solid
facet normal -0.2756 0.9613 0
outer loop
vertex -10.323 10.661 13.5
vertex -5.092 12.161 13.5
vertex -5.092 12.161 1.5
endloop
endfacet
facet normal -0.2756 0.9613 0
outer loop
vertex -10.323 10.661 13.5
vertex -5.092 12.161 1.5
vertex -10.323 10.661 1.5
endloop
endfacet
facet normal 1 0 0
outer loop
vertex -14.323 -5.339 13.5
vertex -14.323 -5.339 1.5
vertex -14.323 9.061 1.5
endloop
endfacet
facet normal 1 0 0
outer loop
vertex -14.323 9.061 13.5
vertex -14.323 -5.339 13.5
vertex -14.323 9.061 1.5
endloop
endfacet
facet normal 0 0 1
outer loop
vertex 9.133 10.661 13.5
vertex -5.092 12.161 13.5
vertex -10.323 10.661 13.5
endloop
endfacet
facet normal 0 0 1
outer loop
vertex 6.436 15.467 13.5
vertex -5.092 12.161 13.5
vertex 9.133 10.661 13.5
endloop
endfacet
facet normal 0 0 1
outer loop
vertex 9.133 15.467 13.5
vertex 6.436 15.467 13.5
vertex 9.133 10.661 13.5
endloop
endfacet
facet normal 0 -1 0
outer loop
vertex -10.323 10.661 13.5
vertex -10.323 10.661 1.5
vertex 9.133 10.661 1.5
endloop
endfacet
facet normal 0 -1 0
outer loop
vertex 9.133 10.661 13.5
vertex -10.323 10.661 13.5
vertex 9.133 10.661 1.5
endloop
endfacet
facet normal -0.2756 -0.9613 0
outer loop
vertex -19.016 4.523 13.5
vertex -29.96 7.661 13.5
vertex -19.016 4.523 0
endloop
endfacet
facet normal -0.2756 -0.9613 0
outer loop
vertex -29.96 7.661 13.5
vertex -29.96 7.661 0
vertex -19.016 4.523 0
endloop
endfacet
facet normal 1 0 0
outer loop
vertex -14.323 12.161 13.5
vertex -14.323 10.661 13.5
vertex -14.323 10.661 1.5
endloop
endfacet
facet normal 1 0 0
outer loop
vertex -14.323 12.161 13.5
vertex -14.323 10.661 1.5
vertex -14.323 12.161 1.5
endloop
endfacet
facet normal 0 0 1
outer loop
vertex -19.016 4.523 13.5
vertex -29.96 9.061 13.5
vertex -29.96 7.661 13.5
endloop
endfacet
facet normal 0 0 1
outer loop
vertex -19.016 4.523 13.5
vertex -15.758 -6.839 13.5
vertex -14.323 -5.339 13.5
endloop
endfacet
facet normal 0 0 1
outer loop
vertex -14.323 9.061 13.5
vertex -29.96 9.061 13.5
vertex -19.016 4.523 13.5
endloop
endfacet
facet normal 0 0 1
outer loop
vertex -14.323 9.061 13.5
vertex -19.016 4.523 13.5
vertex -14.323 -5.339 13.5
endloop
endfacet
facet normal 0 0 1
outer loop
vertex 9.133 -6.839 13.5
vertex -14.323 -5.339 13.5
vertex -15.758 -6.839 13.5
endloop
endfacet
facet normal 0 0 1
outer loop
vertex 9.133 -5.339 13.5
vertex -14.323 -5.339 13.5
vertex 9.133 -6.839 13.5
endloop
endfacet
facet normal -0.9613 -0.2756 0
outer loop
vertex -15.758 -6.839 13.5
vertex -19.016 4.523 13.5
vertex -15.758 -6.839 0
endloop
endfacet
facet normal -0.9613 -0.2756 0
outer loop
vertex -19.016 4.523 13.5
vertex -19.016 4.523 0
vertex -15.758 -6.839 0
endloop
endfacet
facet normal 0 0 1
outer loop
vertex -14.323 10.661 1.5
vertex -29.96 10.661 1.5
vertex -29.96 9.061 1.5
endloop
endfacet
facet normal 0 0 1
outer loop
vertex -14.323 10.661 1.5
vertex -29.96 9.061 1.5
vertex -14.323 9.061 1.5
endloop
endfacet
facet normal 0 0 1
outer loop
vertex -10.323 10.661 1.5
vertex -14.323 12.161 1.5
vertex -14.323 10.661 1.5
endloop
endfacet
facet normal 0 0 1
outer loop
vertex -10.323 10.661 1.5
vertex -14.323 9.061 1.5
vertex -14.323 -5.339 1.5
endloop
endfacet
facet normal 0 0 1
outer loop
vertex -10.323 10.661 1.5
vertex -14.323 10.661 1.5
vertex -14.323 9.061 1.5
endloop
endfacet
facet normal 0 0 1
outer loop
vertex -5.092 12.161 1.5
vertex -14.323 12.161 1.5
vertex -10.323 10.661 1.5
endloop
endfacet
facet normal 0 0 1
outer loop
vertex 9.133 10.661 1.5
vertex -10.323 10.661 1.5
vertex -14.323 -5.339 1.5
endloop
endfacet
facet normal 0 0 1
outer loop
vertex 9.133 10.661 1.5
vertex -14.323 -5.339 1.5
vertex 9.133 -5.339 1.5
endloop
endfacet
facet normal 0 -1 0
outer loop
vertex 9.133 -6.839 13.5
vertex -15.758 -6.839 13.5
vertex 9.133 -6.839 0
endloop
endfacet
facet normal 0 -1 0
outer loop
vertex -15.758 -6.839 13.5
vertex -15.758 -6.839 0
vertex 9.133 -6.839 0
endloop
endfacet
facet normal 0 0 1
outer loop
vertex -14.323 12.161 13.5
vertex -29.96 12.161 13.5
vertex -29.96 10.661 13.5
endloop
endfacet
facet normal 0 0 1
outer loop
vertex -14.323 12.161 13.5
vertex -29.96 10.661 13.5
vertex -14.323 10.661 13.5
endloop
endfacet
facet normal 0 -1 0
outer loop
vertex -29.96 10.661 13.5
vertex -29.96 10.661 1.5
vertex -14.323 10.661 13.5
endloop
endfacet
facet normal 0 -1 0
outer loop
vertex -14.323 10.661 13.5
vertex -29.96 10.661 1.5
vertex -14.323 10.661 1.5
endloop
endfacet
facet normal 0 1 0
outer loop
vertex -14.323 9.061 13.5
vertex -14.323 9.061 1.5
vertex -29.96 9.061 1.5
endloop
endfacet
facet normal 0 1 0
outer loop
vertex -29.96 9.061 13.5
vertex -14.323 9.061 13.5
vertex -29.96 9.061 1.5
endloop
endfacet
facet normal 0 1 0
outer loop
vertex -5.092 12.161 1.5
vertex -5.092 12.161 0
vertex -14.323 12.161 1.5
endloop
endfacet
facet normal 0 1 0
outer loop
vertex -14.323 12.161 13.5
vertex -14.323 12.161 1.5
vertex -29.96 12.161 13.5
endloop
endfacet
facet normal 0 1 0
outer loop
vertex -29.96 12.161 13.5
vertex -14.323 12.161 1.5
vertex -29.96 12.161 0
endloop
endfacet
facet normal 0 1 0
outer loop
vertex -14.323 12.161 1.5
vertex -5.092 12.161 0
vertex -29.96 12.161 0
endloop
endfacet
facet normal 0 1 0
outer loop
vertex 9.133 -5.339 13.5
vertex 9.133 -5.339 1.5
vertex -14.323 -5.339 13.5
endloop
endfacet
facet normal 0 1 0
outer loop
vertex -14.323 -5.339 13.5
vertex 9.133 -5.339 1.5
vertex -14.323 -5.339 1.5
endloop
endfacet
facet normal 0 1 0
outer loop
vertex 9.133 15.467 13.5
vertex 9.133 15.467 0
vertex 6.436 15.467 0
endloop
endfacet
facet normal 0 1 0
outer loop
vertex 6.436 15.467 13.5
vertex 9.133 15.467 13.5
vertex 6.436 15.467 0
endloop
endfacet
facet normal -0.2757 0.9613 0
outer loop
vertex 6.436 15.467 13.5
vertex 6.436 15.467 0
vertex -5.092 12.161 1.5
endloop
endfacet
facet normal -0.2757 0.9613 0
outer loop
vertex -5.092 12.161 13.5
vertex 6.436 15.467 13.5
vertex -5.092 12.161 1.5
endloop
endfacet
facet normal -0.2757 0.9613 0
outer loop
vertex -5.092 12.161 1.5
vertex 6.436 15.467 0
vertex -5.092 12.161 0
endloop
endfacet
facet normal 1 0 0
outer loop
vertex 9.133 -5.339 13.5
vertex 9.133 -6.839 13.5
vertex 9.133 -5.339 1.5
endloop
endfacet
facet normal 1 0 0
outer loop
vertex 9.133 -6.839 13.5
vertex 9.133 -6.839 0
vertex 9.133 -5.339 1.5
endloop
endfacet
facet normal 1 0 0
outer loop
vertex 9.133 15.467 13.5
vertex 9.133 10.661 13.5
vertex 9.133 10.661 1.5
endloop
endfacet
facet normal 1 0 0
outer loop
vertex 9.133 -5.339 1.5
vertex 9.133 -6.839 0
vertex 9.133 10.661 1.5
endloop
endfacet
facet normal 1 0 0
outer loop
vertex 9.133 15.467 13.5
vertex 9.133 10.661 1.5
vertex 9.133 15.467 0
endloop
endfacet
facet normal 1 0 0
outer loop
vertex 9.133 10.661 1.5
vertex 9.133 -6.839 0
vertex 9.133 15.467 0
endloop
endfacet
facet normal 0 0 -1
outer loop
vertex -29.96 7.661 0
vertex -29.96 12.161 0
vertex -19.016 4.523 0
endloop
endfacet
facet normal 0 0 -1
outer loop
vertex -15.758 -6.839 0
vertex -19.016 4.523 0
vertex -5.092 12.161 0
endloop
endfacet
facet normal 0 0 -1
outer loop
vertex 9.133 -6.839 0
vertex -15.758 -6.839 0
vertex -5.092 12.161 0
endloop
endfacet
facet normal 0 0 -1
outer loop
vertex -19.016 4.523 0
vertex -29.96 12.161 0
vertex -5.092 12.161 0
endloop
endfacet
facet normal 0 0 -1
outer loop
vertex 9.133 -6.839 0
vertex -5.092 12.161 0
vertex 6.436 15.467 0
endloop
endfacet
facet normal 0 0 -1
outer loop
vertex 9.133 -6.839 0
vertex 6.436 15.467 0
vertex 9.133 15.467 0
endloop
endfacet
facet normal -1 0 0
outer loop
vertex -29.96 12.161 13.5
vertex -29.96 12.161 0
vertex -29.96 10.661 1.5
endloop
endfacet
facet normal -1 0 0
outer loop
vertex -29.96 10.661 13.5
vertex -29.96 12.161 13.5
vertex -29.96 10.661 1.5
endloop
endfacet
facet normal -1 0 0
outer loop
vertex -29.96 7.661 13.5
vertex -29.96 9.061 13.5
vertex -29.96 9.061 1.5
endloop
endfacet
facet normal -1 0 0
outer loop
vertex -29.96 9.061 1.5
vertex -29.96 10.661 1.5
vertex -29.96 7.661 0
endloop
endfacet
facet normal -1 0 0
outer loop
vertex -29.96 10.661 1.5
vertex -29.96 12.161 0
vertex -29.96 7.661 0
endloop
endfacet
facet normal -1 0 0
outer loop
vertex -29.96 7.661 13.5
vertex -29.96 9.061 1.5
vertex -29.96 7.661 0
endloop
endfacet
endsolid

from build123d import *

# Parameters (mm, degrees)
F1_DEPTH = 1.5
F2_W     = 15.637528
F2_H     = 1.5
F3_DEPTH = 12


with BuildPart() as f1:
    # F0 (on Top) → F1 (new body)
    with BuildSketch(Plane.XY):
        Polygon((-5.091527, 12.161472), (-29.960176, 12.161472), (-29.960176, 7.661472), (-19.016238, 4.523348), (-15.758272, -6.838528), (9.13308, -6.838528), (9.13308, 15.466857), (6.43572, 15.466857), align=None)
    extrude(amount=F1_DEPTH)

    # F2 (on face) → F3 (join)
    with BuildSketch(Plane.XY.offset(1.5)):
        Polygon((-29.960176, 9.061472), (-29.960176, 7.661472), (-19.016238, 4.523348), (-15.758272, -6.838528), (9.13308, -6.838528), (9.13308, -5.338528), (-14.322648, -5.338528), (-14.322648, 9.061472), align=None)
        with Locations((-22.141412, 11.411472)):
            Rectangle(F2_W, F2_H)
        Polygon((-10.322648, 10.661472), (9.13308, 10.661472), (9.13308, 15.466857), (6.43572, 15.466857), (-5.091527, 12.161472), align=None)
    extrude(amount=F3_DEPTH)


solid = f1.part
